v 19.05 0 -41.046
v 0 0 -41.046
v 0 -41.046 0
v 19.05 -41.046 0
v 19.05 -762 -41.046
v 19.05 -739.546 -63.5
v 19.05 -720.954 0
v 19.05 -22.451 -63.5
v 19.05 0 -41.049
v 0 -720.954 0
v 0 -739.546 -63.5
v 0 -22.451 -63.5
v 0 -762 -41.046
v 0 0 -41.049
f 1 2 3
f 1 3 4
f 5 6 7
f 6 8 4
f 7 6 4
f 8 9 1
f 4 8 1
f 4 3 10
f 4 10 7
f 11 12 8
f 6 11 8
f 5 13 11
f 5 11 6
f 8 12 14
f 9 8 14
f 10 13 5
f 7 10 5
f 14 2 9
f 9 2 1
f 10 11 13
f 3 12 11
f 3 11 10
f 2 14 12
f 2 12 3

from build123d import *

# Parameters (mm, degrees)
F0_W     = 19.05
F0_H     = 63.5
F1_DEPTH = 762
F2_SIZE  = 41.0464
F7_DEPTH = 19.051
F8_SIZE  = 22.45359


# Not quite as in the source:
# - a fillet or chamfer is up to 0.001 mm smaller than in the source, because OpenCascade refuses the exact size


with BuildPart() as f1:
    # F0 (on Front) → F1 (new body)
    with BuildSketch(Plane.XZ):
        with Locations((9.525, -31.75)):
            Rectangle(F0_W, F0_H)
    extrude(amount=F1_DEPTH)

    # F2
    f2_edges = [f1.edges().sort_by_distance(p)[0] for p in [
        (9.525, 0, 0),
        (9.525, -762, 0),
    ]]
    chamfer(f2_edges, length=F2_SIZE)

    # F6 (on face) → F7 (cut, through all)
    with BuildSketch(Plane(origin=(0, 0, 0), x_dir=(0, -1, 0), z_dir=(-1, 0, 0))):
        Polygon((0, -41.0493596973), (0, -63.5), (22.4506403027, -63.5), align=None)
    extrude(amount=-F7_DEPTH, mode=Mode.SUBTRACT)

    # F8 (size 22.4536 in the source; OpenCascade refuses exactly that, so slightly less here)
    f8_edges = [f1.edges().sort_by_distance(p)[0] for p in [
        (9.525, -762, -63.5),
    ]]
    chamfer(f8_edges, length=F8_SIZE)


solid = f1.part
